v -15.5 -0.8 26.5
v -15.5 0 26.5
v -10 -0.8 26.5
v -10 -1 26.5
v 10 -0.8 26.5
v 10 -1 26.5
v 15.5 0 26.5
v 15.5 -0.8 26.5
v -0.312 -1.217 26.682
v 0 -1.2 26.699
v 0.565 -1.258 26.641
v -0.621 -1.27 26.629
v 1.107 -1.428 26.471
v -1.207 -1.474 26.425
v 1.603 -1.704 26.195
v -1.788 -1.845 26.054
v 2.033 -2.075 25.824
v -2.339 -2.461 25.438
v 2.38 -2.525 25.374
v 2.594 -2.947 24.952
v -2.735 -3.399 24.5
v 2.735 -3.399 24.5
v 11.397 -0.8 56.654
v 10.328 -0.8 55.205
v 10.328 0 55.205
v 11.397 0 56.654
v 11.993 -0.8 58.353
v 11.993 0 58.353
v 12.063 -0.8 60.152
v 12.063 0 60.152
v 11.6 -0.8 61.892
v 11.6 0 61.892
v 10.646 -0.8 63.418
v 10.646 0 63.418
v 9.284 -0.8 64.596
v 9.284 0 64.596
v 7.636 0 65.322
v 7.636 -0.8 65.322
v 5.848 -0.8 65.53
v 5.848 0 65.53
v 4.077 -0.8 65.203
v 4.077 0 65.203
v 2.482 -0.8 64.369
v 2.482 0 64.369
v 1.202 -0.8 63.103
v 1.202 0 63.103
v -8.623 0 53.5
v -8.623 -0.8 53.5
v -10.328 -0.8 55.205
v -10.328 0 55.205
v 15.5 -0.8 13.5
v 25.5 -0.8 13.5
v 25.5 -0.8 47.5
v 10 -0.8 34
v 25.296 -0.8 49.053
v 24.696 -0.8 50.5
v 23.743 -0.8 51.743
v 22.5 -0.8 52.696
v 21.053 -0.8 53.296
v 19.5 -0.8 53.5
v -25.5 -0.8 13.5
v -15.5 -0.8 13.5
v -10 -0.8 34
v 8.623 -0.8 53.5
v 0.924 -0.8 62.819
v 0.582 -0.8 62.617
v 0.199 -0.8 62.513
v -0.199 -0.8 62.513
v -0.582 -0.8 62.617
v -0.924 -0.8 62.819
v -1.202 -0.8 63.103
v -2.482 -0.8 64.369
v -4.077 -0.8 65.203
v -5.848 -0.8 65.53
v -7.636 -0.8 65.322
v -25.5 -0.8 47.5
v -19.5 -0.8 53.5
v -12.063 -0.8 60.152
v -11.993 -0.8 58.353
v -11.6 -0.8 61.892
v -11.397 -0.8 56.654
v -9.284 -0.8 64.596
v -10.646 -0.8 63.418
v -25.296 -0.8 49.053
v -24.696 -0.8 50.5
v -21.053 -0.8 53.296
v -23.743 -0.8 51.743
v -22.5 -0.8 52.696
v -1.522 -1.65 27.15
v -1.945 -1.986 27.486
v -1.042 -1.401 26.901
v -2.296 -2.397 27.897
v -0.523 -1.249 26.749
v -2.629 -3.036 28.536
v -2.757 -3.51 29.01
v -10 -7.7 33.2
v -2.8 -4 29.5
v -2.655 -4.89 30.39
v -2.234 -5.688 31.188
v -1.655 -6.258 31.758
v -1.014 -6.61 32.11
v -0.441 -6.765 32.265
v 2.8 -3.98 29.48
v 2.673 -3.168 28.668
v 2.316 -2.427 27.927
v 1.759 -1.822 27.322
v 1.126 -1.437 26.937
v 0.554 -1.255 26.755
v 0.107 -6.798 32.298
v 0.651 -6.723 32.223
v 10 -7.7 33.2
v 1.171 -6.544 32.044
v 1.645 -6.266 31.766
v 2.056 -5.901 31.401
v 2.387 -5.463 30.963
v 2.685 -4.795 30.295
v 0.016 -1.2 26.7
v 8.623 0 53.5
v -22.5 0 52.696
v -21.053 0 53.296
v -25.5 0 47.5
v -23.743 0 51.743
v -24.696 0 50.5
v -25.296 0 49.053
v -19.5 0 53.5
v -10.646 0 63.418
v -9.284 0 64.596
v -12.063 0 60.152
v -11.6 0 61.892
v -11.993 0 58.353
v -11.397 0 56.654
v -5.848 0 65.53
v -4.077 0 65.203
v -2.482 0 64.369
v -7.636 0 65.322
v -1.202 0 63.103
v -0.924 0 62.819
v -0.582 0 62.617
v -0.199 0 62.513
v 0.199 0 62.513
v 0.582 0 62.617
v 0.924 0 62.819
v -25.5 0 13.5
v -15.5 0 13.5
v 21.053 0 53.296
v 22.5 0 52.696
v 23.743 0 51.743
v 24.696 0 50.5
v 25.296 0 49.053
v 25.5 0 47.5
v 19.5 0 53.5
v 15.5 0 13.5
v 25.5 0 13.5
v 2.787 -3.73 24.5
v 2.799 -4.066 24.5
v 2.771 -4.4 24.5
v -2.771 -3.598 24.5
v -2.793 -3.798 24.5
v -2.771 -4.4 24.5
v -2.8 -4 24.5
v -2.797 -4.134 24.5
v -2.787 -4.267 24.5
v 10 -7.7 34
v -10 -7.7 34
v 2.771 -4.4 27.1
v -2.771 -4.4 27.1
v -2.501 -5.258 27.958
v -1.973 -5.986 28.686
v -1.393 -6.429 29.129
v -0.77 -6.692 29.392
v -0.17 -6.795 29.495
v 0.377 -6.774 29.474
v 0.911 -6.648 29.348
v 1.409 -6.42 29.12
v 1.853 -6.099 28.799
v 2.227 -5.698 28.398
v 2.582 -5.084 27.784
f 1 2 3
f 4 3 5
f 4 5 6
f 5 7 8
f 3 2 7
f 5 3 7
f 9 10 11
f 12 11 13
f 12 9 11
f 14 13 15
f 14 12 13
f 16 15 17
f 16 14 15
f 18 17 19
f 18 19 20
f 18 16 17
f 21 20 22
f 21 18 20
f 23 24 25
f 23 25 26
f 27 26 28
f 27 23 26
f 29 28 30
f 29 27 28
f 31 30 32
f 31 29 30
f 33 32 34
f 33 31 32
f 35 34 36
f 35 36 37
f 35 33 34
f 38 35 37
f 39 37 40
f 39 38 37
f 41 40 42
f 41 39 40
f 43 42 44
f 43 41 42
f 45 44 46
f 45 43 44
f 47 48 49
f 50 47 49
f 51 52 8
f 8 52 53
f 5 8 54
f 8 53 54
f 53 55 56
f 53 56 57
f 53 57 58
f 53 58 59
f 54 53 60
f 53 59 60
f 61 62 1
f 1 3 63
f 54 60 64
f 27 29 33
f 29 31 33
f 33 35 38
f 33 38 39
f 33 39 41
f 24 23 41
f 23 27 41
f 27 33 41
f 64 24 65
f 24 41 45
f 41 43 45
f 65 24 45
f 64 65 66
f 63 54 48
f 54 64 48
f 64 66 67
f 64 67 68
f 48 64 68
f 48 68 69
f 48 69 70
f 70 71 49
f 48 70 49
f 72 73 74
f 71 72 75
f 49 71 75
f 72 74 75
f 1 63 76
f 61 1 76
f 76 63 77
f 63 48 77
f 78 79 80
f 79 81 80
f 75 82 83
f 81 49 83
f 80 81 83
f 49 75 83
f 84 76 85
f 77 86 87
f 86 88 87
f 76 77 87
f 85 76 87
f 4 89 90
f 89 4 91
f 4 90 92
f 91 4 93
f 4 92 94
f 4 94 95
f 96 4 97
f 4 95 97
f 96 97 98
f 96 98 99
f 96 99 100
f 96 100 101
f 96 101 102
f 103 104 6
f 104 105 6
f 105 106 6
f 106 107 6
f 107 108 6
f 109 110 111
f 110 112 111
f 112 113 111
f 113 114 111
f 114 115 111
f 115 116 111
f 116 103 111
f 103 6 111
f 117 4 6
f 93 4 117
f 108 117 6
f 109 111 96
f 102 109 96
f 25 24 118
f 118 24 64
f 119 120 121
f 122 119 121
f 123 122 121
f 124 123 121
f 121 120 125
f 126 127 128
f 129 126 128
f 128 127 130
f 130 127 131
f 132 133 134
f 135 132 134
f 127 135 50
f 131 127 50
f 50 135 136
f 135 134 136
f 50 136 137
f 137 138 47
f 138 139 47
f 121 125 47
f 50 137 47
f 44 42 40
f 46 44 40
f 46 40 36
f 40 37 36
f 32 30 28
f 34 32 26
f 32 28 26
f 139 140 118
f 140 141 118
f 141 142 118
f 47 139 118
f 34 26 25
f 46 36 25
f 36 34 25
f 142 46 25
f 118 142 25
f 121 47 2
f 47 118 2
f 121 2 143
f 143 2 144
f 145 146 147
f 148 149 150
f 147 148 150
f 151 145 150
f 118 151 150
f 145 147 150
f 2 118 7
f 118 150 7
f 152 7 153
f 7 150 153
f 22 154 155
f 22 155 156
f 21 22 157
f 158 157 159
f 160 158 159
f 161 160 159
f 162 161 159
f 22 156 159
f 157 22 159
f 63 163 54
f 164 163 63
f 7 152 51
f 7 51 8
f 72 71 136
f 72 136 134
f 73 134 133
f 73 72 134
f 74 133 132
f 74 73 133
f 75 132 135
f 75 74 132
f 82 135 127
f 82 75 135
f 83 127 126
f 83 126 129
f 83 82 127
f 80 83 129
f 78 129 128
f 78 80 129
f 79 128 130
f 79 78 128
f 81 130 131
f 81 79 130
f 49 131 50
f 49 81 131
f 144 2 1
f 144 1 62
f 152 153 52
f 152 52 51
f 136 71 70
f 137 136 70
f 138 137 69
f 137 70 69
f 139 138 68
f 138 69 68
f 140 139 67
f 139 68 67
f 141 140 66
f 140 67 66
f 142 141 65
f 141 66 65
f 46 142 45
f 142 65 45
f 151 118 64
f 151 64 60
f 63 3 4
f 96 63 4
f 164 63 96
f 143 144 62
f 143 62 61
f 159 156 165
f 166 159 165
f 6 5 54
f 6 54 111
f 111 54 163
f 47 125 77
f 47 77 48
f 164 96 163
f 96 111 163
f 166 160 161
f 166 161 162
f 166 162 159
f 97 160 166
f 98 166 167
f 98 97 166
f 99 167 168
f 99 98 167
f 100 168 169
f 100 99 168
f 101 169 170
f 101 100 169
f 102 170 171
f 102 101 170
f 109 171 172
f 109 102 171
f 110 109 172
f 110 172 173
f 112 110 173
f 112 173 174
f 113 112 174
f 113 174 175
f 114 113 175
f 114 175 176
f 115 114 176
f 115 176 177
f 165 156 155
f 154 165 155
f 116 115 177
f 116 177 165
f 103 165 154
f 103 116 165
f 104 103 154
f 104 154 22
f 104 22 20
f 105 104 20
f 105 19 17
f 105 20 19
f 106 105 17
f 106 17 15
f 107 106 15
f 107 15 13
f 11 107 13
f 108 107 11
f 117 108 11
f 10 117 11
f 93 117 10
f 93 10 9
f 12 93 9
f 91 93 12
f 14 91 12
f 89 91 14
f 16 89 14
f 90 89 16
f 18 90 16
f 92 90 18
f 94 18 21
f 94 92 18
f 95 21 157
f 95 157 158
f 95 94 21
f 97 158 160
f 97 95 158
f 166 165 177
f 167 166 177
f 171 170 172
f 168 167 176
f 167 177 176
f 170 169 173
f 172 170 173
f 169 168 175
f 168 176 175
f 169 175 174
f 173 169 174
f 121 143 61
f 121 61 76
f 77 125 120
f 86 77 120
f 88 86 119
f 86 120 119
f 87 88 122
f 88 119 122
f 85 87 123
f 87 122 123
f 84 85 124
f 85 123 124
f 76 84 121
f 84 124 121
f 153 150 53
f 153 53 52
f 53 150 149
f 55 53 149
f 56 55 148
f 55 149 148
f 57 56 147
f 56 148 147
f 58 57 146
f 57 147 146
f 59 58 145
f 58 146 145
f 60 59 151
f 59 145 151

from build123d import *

# Parameters (mm, degrees)
PAD_DEPTH       = 0.8
PAD001_DEPTH    = 10
SKETCH003_R     = 2.8
PAD002_DEPTH    = 9.5
POCKET001_DEPTH = 3
PAD003_DEPTH    = 0.8


with BuildPart() as part:
    # Sketch → Pad (new body)
    with BuildSketch(Plane.XZ):
        with BuildLine():
            Line((-25.5, 13.5), (-25.5, 47.5))
            ThreePointArc((-19.5, 53.5), (-23.742641, 51.742641), (-25.5, 47.5))
            Line((-19.5, 53.5), (19.5, 53.5))
            ThreePointArc((25.5, 47.5), (23.742641, 51.742641), (19.5, 53.5))
            Line((25.5, 47.5), (25.5, 13.5))
            Line((25.5, 13.5), (15.5, 13.5))
            Line((15.5, 13.5), (15.5, 26.5))
            Line((15.5, 26.5), (-15.5, 26.5))
            Line((-15.5, 26.5), (-15.5, 13.5))
            Line((-15.5, 13.5), (-25.5, 13.5))
        make_face()
    extrude(amount=PAD_DEPTH)

    # Sketch001 → Pad001 (join, symmetric)
    with BuildSketch(Plane.YZ):
        Polygon((-1, 26.5), (-7.7, 33.2), (-7.7, 34), (0, 34), (0, 26.5), align=None)
    extrude(amount=PAD001_DEPTH, both=True)

    # Sketch003 (on Face12 of Pad001) → Pad002 (join)
    with BuildSketch(Plane(origin=(0, 0, 34), x_dir=(-1, 0, 0), z_dir=(0, 0, 1))):
        with Locations((0, 4)):
            Circle(SKETCH003_R)
    extrude(amount=-PAD002_DEPTH)

    # Sketch004 → Pocket001 (cut, symmetric)
    with BuildSketch(Plane.YZ):
        Polygon((-1.2, 26.699), (-3.399, 24.5), (-1.2, 24.5), align=None)
        Polygon((-7.7, 30.4), (-7.7, 24.5), (-4.4, 24.5), (-4.4, 27.1), align=None)
    extrude(amount=POCKET001_DEPTH, both=True, mode=Mode.SUBTRACT)

    # Sketch005 (on Face5 of Pocket001) → Pad003 (join)
    with BuildSketch(Plane.XZ.offset(0.8)):
        with BuildLine():
            Line((-7.122628, 52), (-10.327996, 55.205368))
            ThreePointArc((-1.201987, 63.102655), (-10.008916, 64.058239), (-10.327996, 55.205368))
            ThreePointArc((-1.201987, 63.102655), (0, 62.5), (1.201987, 63.102655))
            ThreePointArc((10.327996, 55.205368), (10.008916, 64.058239), (1.201987, 63.102655))
            Line((10.327996, 55.205368), (7.122628, 52))
            Line((7.122628, 52), (-7.122628, 52))
        make_face()
    extrude(amount=-PAD003_DEPTH)


solid = part.part
